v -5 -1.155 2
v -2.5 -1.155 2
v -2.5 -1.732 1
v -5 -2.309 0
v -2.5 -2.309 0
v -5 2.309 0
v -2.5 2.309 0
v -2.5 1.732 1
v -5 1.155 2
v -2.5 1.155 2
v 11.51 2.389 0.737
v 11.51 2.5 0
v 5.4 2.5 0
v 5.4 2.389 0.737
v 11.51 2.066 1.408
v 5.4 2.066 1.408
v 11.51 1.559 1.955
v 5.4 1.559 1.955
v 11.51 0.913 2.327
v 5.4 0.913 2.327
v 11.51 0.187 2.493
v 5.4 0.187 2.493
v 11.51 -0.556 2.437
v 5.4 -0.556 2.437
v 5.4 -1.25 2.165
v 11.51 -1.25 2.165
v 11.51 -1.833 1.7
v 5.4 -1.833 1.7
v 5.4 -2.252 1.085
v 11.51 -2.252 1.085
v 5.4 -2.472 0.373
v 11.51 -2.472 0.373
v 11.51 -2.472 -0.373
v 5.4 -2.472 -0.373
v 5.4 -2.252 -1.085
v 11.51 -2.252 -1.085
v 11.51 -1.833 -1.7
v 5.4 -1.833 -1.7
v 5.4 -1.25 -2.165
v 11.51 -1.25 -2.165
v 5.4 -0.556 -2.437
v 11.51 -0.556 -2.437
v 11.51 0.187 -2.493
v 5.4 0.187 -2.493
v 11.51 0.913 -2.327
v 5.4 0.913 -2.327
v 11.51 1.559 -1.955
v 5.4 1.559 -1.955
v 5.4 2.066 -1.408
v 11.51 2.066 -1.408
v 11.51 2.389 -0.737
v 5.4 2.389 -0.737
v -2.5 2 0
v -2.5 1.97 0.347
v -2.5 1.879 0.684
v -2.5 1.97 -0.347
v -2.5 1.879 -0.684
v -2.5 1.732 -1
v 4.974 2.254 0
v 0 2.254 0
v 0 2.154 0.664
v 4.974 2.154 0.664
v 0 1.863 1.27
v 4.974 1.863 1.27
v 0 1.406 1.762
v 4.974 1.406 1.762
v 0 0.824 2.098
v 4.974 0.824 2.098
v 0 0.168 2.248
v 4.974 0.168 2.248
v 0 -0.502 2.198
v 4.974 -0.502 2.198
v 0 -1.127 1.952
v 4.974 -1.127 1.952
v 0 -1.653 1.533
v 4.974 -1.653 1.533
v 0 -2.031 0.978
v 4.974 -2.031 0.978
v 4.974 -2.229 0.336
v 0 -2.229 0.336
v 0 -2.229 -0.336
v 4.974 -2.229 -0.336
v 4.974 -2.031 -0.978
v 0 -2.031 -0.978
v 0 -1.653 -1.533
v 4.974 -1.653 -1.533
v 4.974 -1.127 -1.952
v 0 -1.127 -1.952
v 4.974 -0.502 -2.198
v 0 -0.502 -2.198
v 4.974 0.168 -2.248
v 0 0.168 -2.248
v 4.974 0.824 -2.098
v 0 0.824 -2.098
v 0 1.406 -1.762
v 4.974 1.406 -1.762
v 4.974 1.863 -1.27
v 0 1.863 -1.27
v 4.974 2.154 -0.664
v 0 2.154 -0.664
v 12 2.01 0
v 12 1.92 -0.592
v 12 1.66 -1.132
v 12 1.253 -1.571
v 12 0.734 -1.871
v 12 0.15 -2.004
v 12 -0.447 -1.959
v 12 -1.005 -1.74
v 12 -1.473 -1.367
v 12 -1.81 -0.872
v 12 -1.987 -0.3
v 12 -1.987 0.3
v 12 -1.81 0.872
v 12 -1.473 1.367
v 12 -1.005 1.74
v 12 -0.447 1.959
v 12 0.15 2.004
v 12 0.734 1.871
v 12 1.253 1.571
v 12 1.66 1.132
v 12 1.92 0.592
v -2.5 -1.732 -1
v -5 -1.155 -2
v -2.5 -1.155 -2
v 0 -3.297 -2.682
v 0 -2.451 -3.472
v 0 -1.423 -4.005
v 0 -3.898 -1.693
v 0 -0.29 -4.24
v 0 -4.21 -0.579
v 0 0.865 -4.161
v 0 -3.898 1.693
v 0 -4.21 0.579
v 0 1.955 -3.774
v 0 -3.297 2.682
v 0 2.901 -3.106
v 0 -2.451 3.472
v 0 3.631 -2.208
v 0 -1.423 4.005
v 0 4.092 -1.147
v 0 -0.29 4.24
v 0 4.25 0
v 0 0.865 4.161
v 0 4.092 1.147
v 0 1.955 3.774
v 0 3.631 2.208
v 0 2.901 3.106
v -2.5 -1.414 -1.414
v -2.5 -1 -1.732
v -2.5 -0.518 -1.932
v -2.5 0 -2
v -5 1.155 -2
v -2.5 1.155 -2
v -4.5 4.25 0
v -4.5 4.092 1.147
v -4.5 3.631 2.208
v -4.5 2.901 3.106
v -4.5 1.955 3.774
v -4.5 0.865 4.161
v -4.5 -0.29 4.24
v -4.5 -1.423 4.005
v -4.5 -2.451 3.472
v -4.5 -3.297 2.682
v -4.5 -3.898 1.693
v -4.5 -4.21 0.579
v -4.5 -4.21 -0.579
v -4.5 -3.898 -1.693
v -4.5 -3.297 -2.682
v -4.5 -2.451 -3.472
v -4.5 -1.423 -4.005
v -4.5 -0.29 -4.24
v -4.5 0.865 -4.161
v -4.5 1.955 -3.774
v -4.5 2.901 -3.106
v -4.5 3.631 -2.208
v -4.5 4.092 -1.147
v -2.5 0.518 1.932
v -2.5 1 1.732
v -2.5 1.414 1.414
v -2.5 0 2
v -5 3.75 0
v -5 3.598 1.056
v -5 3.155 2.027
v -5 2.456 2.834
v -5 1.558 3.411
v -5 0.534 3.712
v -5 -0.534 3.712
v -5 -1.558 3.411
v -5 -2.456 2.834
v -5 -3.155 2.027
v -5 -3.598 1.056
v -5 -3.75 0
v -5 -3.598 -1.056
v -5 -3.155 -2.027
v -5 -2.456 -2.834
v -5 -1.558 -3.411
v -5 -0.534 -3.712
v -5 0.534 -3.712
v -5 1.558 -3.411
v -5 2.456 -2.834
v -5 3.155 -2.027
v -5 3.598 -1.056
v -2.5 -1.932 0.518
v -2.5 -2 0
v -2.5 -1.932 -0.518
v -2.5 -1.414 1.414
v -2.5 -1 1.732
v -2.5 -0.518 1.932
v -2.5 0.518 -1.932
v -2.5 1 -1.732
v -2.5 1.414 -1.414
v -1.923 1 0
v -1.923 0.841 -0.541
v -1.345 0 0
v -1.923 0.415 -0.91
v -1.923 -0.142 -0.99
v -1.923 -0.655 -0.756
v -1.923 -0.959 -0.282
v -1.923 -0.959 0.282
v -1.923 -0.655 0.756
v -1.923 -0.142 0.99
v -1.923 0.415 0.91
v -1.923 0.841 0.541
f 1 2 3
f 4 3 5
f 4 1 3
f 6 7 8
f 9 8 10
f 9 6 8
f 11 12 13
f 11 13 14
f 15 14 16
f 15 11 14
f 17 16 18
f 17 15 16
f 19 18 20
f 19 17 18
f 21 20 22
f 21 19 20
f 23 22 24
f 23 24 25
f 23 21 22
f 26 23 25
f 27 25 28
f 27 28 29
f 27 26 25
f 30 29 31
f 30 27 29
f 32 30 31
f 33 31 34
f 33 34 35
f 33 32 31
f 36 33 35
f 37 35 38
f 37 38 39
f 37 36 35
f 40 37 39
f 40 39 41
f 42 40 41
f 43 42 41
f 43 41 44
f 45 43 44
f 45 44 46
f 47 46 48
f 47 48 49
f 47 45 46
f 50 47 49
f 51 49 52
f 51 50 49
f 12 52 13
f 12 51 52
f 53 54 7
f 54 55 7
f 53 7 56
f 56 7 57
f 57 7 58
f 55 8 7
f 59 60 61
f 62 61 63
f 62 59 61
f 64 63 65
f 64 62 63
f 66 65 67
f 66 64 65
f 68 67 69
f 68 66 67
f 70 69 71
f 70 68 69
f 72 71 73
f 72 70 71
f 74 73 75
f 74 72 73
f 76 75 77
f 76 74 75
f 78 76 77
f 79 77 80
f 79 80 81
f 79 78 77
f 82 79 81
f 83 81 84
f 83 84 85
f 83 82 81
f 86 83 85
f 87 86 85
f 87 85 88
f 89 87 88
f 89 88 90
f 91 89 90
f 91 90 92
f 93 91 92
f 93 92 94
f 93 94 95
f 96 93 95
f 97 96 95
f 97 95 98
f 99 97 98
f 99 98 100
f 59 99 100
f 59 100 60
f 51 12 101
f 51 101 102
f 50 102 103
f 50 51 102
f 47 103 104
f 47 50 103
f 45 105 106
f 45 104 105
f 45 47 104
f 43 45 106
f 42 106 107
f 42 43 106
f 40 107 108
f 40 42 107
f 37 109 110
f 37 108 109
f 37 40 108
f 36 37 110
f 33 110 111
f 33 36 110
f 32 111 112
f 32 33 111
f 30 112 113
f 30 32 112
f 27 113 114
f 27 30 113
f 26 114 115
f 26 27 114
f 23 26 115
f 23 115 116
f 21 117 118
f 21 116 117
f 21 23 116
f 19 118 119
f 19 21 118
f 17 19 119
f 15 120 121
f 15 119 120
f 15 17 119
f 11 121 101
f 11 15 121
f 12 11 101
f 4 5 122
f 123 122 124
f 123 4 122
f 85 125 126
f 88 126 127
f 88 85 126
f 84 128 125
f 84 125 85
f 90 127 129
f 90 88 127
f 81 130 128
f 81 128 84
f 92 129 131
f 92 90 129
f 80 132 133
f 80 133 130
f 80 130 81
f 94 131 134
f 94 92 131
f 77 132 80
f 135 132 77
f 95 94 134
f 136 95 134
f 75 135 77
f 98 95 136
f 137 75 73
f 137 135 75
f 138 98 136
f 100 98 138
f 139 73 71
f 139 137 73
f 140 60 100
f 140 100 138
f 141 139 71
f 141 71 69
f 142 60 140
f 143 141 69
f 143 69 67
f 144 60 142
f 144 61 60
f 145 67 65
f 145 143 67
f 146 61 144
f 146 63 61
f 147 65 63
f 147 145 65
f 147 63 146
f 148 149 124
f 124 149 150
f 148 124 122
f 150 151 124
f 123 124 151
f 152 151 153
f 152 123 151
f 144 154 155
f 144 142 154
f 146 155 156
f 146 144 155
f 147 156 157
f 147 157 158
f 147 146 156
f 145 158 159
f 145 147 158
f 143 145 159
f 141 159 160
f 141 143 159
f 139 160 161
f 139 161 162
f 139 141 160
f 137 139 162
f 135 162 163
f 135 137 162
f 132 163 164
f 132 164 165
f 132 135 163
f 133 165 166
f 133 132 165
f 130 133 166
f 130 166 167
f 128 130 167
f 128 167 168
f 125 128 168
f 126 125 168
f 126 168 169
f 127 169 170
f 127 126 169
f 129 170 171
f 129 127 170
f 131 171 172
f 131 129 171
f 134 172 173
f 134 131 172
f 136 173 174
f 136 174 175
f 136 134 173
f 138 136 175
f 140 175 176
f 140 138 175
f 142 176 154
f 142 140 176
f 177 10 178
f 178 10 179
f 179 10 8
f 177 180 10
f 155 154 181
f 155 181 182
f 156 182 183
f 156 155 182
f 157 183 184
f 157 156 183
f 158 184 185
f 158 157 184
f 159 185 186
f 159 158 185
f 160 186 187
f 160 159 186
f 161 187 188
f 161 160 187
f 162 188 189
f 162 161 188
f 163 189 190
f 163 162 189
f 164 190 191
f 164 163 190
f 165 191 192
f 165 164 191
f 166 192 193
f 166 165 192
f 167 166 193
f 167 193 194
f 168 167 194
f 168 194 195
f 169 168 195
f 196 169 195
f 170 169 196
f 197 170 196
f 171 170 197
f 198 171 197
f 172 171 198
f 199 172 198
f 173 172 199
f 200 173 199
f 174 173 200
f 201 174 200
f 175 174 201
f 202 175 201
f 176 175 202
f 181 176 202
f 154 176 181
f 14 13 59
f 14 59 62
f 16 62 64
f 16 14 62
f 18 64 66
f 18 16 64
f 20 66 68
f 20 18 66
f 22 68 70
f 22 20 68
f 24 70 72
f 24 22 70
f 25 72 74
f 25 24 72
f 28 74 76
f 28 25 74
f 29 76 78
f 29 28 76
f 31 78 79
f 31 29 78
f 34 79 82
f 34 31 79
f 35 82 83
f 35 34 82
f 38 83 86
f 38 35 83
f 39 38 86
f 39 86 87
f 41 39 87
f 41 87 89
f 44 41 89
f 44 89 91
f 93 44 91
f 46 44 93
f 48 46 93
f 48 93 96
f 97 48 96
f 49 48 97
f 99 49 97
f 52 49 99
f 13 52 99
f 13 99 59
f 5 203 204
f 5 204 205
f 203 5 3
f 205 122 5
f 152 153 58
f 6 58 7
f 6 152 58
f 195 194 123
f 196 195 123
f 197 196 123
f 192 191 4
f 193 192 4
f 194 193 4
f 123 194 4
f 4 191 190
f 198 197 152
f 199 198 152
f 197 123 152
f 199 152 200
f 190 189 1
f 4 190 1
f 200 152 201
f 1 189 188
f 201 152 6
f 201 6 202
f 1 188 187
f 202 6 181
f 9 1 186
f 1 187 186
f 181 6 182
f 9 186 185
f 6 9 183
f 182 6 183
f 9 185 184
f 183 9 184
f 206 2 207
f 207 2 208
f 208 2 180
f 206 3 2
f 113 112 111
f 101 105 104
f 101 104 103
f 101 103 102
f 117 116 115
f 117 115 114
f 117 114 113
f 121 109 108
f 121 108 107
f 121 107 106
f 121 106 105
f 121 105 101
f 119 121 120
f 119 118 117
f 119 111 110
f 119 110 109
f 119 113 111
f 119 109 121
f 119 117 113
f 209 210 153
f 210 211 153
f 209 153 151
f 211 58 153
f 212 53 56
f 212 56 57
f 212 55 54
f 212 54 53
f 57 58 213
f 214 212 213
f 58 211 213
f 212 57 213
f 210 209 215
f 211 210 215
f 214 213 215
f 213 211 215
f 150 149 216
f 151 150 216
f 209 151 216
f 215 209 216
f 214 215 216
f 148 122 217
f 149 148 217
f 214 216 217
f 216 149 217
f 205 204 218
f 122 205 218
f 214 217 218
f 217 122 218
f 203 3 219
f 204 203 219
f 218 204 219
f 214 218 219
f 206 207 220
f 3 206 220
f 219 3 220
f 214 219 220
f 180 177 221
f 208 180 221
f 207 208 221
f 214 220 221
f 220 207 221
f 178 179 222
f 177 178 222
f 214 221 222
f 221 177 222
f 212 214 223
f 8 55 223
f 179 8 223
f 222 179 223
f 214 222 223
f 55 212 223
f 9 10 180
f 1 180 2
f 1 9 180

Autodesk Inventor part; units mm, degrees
sketch "Sketch_6" plane through (0, 0, 0) normal (0, 0, 1) x (1, 0, 0)
  line L0 (12, 0) -> (4.5504, 0)
  line L1 (4.5504, 0) -> (4.5504, 2.0095)
  line L2 (4.5504, 2.0095) -> (5.4, 2.5)
  line L3 (5.4, 2.5) -> (11.5095, 2.5)
  line L4 (11.5095, 2.5) -> (12, 2.0095)
  line L5 (12, 2.0095) -> (12, 0)
  line L6 (12, 0) -> (4.5504, 0)
revolve "Revolution1" add sketch "Sketch_6" angle 360 about axis through (12, 0, 0) along (1, 0, 0)
thread "Thread1" size "M5x0.8" class "6g" standard "ISO Metric profile" full length
sketch "Sketch_1" plane through (0, 0, 0) normal (0, 0, 1) x (1, 0, 0)
  line L0 (5.4, 0) -> (-5, 0)
  line L1 (-1.3453, 0) -> (-2.5, 2)
  line L2 (-2.5, 2) -> (-5, 2)
  line L3 (-5, 2) -> (-5, 3.75)
  line L4 (-5, 3.75) -> (-4.5, 4.25)
  line L5 (-4.5, 4.25) -> (0, 4.25)
  line L6 (0, 4.25) -> (0, 2.2543)
  line L7 (0, 2.2543) -> (5.4, 2.2543)
  line L8 (5.4, 2.2543) -> (5.4, 0)
  line L9 (5.4, 0) -> (-1.3453, 0)
revolve "Revolution2" add sketch "Sketch_1" angle 360 about axis through (5.4, 0, 0) along (1, 0, 0)
sketch "Sketch_2" plane through (-5, 0, 0) normal (1, 0, 0) x (0, 0, -1)
  line L0 (-2, 1.1547) -> (-2, -1.1547)
  line L1 (-2, -1.1547) -> (0, -2.3094)
  line L2 (0, -2.3094) -> (2, -1.1547)
  line L3 (2, -1.1547) -> (2, 1.1547)
  line L4 (2, 1.1547) -> (0, 2.3094)
  line L5 (0, 2.3094) -> (-2, 1.1547)
extrude "Extrusion1" cut sketch "Sketch_2" along normal blind 2.5
ref_plane "bolt_to_spring_washer_XY" through (1.8, 0, 0) normal (1, 0, 0) x (0, 0, -1)
ref_plane "bolt_to_spring_washer_YZ" through (1.8, 0, 0) normal (0, 0, -1) x (0, 1, 0)
ref_plane "bolt_to_spring_washer_ZX" through (1.8, 0, 0) normal (0, 1, 0) x (1, 0, 0)
ref_plane "bolt_to_plane_washer_XY" through (3.6, 0, 0) normal (1, 0, 0) x (0, 0, -1)
ref_plane "bolt_to_plane_washer_YZ" through (3.6, 0, 0) normal (0, 0, -1) x (0, 1, 0)
ref_plane "bolt_to_plane_washer_ZX" through (3.6, 0, 0) normal (0, 1, 0) x (1, 0, 0)
ref_plane "screw_to_body_XY" through (0, 0, 0) normal (1, 0, 0) x (0, 0, -1)
ref_plane "screw_to_body_YZ" through (0, 0, 0) normal (0, 0, -1) x (0, 1, 0)
ref_plane "screw_to_body_ZX" through (0, 0, 0) normal (0, 1, 0) x (1, 0, 0)
properties part number "HCBST5-12_Screw"
